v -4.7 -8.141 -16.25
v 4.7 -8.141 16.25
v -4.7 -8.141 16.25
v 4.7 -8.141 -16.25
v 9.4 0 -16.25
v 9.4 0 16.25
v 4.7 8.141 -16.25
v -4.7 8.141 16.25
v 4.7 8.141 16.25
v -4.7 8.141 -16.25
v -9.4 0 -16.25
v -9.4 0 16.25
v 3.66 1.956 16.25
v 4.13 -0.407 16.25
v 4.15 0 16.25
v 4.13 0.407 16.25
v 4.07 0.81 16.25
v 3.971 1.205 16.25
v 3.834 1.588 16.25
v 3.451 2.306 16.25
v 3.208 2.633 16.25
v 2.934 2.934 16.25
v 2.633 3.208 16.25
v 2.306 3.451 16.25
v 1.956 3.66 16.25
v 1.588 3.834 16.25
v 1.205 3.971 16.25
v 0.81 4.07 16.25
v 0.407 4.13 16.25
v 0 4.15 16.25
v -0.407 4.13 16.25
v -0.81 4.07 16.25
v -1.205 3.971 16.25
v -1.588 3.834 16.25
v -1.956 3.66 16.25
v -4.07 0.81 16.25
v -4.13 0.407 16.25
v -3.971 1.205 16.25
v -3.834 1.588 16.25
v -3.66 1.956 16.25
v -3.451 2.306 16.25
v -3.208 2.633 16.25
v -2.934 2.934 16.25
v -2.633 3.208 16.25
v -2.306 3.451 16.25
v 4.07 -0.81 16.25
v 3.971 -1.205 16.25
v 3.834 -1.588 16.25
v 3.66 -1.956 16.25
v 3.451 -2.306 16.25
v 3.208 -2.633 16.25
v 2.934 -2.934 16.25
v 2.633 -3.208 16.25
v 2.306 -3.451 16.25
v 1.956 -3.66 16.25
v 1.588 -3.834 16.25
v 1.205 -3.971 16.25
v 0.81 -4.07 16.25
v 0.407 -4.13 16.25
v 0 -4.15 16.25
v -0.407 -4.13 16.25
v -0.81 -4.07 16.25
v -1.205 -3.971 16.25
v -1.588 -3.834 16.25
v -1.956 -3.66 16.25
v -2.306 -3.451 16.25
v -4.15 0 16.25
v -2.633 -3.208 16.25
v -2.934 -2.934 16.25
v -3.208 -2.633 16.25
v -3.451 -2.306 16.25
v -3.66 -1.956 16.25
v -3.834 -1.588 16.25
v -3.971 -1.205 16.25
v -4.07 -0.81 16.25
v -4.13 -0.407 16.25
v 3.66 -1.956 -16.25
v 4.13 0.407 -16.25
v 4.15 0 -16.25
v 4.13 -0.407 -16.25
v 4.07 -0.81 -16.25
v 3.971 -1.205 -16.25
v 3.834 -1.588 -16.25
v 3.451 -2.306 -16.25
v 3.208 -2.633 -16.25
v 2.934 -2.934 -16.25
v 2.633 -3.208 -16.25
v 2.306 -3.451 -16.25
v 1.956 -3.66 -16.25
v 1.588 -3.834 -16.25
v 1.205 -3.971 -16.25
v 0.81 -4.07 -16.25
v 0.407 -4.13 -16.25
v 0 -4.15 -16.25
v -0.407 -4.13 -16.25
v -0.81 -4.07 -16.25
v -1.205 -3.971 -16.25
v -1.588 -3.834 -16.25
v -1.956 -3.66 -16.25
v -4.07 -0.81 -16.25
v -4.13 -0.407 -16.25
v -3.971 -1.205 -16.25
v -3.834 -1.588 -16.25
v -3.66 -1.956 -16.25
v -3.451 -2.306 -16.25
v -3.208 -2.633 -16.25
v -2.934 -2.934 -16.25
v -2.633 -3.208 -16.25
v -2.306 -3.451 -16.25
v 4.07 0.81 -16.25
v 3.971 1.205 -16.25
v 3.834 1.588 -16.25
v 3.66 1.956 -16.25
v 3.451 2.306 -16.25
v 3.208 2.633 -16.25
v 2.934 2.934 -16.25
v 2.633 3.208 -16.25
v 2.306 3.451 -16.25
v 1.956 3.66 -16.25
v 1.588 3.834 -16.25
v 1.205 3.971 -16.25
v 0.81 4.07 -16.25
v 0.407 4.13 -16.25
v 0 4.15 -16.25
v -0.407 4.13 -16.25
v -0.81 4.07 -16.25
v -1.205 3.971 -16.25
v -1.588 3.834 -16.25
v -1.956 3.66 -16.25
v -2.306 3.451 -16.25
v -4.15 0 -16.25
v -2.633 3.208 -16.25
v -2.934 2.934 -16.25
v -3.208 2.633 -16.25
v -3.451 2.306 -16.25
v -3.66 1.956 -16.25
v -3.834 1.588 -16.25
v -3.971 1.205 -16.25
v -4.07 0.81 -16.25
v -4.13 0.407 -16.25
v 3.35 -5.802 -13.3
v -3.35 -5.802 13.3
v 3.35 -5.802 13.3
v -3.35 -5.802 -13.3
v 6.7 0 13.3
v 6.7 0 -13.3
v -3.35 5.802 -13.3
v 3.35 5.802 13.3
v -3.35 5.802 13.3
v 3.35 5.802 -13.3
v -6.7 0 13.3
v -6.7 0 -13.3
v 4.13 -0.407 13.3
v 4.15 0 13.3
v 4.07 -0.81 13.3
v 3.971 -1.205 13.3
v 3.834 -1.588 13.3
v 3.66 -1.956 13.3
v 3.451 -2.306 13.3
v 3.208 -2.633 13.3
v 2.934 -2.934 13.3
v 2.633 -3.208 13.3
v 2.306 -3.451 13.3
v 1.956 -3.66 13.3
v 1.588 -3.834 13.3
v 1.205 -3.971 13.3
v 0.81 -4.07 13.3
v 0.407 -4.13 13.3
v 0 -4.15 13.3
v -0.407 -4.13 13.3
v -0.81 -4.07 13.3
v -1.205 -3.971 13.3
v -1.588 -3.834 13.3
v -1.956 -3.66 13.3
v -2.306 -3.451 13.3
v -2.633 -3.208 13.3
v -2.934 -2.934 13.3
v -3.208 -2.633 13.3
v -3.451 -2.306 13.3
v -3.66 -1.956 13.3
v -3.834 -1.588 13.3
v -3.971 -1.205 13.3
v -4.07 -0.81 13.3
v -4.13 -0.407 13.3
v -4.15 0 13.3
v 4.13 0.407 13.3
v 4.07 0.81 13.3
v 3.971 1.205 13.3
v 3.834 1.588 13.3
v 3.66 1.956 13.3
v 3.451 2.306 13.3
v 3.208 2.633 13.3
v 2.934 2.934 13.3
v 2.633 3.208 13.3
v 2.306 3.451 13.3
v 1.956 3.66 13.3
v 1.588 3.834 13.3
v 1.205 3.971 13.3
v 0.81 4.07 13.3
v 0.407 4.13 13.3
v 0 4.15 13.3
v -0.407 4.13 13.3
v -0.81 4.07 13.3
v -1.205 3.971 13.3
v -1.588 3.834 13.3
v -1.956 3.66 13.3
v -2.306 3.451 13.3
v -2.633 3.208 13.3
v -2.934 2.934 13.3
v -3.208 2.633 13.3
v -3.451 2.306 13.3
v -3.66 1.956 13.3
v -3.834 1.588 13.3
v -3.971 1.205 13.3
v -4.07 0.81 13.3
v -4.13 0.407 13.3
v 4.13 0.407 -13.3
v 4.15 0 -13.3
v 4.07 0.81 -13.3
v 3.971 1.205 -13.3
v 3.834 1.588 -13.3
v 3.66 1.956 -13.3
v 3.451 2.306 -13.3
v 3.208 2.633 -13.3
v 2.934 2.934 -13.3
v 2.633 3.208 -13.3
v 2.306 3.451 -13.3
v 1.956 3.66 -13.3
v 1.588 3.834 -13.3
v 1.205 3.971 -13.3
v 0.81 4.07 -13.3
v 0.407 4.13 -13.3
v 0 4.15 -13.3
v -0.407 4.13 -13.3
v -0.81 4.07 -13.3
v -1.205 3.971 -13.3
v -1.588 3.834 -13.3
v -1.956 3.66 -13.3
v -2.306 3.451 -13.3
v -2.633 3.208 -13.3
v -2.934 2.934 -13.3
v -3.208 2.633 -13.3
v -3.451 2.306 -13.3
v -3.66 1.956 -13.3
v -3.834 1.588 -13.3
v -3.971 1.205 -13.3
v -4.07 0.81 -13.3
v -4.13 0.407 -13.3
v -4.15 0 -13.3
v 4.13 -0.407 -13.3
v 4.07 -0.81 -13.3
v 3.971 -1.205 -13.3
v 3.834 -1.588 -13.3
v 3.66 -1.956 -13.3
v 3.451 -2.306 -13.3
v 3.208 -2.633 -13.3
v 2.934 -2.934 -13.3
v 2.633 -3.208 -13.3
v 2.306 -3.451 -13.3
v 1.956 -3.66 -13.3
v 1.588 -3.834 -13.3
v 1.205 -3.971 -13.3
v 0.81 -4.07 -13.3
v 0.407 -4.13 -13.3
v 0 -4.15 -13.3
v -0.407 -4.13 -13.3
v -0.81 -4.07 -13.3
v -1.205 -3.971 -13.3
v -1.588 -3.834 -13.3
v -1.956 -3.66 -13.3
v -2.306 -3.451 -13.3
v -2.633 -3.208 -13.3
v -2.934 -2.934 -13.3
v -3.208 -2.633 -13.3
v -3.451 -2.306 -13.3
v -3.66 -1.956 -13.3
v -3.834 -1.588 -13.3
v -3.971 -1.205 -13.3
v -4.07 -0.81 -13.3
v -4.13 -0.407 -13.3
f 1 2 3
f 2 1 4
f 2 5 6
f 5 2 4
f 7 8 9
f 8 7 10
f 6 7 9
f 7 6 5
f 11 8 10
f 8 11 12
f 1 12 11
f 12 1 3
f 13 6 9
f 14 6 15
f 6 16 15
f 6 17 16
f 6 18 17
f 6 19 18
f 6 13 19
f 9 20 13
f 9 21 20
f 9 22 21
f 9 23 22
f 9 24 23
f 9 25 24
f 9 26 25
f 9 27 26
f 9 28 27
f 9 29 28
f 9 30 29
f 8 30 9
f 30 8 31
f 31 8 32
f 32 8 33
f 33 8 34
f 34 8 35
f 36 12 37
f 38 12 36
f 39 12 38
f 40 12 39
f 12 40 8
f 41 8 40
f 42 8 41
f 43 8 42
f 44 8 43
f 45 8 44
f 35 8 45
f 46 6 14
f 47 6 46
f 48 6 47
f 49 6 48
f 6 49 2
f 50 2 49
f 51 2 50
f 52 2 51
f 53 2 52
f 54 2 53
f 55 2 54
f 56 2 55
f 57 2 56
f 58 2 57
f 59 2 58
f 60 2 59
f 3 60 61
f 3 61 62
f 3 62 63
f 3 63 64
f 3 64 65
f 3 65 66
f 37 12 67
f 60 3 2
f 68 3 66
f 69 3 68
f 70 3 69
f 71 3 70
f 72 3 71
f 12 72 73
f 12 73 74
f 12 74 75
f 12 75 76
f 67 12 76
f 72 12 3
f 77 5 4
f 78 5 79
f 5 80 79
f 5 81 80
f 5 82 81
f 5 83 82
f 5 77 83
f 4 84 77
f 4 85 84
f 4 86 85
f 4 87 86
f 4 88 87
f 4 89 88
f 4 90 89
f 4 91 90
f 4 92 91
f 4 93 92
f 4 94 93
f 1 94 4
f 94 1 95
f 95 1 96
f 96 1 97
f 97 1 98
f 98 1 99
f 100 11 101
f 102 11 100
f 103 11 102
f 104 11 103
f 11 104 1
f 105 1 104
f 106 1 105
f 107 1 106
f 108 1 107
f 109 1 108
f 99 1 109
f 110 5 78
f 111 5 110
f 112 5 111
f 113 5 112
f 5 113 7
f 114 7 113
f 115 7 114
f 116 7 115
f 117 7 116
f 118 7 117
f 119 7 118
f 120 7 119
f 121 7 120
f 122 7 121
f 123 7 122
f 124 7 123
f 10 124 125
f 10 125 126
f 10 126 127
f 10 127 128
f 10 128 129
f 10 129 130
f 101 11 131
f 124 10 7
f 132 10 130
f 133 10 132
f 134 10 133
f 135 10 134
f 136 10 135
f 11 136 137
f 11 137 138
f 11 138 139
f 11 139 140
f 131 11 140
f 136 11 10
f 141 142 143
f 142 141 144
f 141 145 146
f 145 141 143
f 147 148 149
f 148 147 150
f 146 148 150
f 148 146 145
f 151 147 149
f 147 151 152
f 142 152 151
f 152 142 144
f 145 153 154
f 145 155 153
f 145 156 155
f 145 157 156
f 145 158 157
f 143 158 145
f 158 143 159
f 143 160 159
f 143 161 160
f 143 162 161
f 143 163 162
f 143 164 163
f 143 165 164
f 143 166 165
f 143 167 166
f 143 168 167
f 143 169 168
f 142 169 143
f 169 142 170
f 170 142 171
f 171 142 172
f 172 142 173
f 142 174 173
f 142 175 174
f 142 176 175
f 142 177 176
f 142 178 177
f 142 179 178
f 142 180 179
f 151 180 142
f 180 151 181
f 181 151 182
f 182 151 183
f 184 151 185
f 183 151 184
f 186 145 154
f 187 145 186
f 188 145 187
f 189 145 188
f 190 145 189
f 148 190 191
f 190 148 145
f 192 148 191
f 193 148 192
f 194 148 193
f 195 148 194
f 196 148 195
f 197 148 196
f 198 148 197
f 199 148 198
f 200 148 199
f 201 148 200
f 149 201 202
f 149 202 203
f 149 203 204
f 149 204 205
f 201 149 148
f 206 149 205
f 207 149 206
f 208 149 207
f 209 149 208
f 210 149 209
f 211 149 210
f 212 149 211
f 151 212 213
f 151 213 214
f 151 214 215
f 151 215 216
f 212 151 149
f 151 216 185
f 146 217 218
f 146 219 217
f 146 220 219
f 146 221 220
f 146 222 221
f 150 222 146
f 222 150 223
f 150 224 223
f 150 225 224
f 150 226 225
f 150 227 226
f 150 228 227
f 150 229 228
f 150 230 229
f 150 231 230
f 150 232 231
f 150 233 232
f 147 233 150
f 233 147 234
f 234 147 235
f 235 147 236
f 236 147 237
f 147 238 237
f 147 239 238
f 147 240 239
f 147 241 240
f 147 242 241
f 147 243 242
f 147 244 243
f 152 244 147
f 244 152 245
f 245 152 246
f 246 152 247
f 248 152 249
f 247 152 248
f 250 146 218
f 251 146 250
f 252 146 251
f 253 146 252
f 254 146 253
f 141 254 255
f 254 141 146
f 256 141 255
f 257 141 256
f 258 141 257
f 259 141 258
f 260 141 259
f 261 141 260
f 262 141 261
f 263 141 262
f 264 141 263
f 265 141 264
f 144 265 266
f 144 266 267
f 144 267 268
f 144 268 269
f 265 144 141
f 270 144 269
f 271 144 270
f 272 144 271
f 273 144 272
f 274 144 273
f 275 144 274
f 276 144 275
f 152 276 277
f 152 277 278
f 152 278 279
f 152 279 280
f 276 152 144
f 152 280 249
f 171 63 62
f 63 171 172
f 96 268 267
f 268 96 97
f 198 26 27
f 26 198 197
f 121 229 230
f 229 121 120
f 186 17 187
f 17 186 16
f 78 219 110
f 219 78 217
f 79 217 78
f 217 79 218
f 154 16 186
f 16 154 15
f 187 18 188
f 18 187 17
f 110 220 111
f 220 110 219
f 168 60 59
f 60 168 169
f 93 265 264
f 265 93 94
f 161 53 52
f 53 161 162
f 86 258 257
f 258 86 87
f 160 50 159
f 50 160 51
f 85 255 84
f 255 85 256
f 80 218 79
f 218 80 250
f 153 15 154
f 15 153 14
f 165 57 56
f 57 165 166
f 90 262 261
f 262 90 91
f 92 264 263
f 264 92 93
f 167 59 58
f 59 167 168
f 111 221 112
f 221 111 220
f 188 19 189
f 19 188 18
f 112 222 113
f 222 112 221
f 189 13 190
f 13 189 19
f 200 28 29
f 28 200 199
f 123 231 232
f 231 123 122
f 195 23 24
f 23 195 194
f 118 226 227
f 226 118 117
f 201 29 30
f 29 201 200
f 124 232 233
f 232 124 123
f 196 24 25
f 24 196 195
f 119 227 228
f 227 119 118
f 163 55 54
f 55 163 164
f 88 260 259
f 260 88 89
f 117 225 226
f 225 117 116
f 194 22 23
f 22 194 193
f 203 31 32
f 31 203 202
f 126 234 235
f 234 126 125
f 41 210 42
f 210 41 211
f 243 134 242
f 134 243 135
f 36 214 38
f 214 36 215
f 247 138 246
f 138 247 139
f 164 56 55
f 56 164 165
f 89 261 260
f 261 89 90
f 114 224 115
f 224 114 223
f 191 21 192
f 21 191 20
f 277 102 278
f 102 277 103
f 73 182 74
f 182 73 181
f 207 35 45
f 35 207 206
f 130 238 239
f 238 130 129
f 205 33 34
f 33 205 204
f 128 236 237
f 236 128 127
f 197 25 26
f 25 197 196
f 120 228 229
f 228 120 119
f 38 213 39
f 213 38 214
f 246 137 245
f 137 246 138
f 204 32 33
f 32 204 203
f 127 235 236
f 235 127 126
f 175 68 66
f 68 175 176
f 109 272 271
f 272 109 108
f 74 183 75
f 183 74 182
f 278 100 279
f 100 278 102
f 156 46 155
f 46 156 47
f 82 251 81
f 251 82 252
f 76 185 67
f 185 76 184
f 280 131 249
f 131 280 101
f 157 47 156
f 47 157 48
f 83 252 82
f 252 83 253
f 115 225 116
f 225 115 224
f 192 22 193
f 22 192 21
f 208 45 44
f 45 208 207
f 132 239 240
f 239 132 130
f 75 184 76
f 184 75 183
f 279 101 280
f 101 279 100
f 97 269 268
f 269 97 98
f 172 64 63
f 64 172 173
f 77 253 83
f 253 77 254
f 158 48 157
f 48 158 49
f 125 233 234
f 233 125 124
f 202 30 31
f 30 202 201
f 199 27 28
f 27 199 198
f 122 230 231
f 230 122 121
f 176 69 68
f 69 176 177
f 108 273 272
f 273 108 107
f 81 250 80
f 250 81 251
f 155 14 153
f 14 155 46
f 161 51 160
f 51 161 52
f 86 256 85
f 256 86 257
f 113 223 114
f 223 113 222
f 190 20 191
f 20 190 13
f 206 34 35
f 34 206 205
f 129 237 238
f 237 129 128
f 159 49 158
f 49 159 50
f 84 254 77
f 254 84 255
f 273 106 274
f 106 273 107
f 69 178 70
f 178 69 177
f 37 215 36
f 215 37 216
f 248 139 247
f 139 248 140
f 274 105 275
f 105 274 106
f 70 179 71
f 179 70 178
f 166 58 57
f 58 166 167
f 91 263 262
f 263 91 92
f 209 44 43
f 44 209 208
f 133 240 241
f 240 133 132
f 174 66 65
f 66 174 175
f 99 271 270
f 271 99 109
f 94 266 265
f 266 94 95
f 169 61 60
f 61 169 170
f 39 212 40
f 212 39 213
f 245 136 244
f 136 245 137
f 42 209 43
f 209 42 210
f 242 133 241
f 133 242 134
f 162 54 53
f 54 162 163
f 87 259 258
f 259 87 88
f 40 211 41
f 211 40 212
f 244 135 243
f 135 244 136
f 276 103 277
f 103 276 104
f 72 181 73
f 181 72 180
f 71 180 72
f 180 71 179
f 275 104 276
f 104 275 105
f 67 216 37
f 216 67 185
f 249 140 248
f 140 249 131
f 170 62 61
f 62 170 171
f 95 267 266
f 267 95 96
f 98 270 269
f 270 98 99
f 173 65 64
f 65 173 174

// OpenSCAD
// file: ../scripts/rounded_box.scad
/**
 * rounded_box.scad
 *
 * Create a rounded box with rounded corners.
 *
 * @param size [x, y, z] - The size of the box.
 * @param radius - The radius of the corners.
 * @param center - Center the box at the origin.
 * @param fn - The number of facets to use for the cylinder.
 *
 * @return {object} - A rounded box with rounded corners.
 */
module rounded_box(size = [10, 10, 10], radius = 2, center = false, fn = 64) {
    hull() {
        for (x = [-1, 1], y = [-1, 1]) {
            translate([x * (size[0] / 2 - radius), y * (size[1] / 2 - radius), 0])
                cylinder(h=size[2], r=radius, center=center, $fn=fn);
        }
    }
}

// Example Usage
rounded_box([30, 20, 10], radius=3);
// file: ../scripts/cross_section.scad
/**
 * Module to show a cross section of the object.
 *
 * @param {boolean} showXSection - Show the cross section.
 * @param {number} size - Size of the cross section.
 * @param {string} color - Color of the cross section.
 */

module cross_section(showXSection = false, size = 100, color = "Red") {
  if (showXSection) {
    difference() {
      children();

      translate([-size / 2, -size, -size / 2]) color(color) cube([size, size, size]);
    }
  } else {
    children();
  }
}

use <rounded_box.scad>;

cross_section(true) rounded_box([30, 20, 10], radius=3);
// main file
use <../scripts/cross_section.scad>;

$fn = $preview ? 32 : 64;
z_fight = $preview ? 0.05 : 0;

// Number 8 threaded rod
rod_diameter = 8;

// Number 8 nut
nut_flat_to_flat = 12.8;
nut_height = 6.5;

// Connector options
wall_thickness = 3;
allowance = 0.3;
num_nuts = 4; // haha get it num nuts

module connecting_rod() {
  connector_height = nut_height * (num_nuts + 1); // nuts height gap before and after

  pocket_height = connector_height - nut_height * 1 + allowance * 2;

  difference() {
    cylinder(d=nut_flat_to_flat + 2 * wall_thickness, h=connector_height, center=true, $fn=6);

    cylinder(d=nut_flat_to_flat + allowance * 2, h=pocket_height + z_fight, center=true, $fn=6);

    // Rod hole
    cylinder(d=rod_diameter + allowance, h=connector_height + z_fight, center=true);
  }
}

cross_section($preview)
  connecting_rod();
